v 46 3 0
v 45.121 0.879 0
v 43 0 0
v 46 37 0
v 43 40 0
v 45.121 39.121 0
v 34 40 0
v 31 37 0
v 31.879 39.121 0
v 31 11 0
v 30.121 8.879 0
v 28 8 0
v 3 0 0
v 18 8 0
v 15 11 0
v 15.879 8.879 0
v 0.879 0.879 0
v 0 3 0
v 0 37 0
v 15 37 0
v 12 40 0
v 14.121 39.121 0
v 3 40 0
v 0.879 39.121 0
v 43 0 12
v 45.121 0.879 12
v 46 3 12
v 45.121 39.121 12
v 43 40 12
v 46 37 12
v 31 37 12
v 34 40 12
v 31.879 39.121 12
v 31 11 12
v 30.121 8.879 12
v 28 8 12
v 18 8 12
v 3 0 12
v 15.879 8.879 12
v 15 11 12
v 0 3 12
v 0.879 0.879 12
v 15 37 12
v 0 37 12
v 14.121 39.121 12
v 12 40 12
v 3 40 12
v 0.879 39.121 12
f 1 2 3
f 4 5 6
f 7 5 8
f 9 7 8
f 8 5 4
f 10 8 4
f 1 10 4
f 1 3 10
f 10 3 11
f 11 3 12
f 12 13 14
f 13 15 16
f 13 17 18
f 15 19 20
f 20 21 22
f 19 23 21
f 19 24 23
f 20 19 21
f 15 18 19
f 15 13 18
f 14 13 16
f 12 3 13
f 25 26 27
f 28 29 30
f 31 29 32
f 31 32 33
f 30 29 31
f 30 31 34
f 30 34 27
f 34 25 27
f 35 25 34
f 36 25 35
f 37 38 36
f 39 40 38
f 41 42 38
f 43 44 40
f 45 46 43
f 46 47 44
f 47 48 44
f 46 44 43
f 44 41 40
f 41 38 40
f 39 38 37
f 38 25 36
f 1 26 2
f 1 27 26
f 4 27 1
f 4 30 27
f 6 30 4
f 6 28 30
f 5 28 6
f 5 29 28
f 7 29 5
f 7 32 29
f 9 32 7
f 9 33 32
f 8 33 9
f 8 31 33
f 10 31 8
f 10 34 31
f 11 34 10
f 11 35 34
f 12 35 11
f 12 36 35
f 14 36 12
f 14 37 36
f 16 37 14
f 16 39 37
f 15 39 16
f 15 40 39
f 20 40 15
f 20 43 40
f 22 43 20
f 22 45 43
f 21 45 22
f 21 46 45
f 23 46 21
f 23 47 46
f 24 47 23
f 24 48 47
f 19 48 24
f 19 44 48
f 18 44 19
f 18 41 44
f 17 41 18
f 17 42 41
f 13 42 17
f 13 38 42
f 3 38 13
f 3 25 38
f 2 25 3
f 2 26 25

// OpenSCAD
$fn = 32;

// ----------------------------------------------------------------------
// Eye lug: clevis, 12 mm thick
// ----------------------------------------------------------------------

// --- parameters (mm) ---
profile_height = 12;      // extrusion height
profile_points = 24;      // points of the closed outline

profile = [[0, 3], [0.879, 0.879], [3, 0], [43, 0], [45.121, 0.879], [46, 3], [46, 37], [45.121, 39.121], [43, 40], [34, 40], [31.879, 39.121], [31, 37], [31, 11], [30.121, 8.879], [28, 8], [18, 8], [15.879, 8.879], [15, 11], [15, 37], [14.121, 39.121], [12, 40], [3, 40], [0.879, 39.121], [0, 37]];  // single closed polygon, 24 points, counter clockwise

// --- the one profile operation ---
linear_extrude(height = profile_height) polygon(points = profile);
